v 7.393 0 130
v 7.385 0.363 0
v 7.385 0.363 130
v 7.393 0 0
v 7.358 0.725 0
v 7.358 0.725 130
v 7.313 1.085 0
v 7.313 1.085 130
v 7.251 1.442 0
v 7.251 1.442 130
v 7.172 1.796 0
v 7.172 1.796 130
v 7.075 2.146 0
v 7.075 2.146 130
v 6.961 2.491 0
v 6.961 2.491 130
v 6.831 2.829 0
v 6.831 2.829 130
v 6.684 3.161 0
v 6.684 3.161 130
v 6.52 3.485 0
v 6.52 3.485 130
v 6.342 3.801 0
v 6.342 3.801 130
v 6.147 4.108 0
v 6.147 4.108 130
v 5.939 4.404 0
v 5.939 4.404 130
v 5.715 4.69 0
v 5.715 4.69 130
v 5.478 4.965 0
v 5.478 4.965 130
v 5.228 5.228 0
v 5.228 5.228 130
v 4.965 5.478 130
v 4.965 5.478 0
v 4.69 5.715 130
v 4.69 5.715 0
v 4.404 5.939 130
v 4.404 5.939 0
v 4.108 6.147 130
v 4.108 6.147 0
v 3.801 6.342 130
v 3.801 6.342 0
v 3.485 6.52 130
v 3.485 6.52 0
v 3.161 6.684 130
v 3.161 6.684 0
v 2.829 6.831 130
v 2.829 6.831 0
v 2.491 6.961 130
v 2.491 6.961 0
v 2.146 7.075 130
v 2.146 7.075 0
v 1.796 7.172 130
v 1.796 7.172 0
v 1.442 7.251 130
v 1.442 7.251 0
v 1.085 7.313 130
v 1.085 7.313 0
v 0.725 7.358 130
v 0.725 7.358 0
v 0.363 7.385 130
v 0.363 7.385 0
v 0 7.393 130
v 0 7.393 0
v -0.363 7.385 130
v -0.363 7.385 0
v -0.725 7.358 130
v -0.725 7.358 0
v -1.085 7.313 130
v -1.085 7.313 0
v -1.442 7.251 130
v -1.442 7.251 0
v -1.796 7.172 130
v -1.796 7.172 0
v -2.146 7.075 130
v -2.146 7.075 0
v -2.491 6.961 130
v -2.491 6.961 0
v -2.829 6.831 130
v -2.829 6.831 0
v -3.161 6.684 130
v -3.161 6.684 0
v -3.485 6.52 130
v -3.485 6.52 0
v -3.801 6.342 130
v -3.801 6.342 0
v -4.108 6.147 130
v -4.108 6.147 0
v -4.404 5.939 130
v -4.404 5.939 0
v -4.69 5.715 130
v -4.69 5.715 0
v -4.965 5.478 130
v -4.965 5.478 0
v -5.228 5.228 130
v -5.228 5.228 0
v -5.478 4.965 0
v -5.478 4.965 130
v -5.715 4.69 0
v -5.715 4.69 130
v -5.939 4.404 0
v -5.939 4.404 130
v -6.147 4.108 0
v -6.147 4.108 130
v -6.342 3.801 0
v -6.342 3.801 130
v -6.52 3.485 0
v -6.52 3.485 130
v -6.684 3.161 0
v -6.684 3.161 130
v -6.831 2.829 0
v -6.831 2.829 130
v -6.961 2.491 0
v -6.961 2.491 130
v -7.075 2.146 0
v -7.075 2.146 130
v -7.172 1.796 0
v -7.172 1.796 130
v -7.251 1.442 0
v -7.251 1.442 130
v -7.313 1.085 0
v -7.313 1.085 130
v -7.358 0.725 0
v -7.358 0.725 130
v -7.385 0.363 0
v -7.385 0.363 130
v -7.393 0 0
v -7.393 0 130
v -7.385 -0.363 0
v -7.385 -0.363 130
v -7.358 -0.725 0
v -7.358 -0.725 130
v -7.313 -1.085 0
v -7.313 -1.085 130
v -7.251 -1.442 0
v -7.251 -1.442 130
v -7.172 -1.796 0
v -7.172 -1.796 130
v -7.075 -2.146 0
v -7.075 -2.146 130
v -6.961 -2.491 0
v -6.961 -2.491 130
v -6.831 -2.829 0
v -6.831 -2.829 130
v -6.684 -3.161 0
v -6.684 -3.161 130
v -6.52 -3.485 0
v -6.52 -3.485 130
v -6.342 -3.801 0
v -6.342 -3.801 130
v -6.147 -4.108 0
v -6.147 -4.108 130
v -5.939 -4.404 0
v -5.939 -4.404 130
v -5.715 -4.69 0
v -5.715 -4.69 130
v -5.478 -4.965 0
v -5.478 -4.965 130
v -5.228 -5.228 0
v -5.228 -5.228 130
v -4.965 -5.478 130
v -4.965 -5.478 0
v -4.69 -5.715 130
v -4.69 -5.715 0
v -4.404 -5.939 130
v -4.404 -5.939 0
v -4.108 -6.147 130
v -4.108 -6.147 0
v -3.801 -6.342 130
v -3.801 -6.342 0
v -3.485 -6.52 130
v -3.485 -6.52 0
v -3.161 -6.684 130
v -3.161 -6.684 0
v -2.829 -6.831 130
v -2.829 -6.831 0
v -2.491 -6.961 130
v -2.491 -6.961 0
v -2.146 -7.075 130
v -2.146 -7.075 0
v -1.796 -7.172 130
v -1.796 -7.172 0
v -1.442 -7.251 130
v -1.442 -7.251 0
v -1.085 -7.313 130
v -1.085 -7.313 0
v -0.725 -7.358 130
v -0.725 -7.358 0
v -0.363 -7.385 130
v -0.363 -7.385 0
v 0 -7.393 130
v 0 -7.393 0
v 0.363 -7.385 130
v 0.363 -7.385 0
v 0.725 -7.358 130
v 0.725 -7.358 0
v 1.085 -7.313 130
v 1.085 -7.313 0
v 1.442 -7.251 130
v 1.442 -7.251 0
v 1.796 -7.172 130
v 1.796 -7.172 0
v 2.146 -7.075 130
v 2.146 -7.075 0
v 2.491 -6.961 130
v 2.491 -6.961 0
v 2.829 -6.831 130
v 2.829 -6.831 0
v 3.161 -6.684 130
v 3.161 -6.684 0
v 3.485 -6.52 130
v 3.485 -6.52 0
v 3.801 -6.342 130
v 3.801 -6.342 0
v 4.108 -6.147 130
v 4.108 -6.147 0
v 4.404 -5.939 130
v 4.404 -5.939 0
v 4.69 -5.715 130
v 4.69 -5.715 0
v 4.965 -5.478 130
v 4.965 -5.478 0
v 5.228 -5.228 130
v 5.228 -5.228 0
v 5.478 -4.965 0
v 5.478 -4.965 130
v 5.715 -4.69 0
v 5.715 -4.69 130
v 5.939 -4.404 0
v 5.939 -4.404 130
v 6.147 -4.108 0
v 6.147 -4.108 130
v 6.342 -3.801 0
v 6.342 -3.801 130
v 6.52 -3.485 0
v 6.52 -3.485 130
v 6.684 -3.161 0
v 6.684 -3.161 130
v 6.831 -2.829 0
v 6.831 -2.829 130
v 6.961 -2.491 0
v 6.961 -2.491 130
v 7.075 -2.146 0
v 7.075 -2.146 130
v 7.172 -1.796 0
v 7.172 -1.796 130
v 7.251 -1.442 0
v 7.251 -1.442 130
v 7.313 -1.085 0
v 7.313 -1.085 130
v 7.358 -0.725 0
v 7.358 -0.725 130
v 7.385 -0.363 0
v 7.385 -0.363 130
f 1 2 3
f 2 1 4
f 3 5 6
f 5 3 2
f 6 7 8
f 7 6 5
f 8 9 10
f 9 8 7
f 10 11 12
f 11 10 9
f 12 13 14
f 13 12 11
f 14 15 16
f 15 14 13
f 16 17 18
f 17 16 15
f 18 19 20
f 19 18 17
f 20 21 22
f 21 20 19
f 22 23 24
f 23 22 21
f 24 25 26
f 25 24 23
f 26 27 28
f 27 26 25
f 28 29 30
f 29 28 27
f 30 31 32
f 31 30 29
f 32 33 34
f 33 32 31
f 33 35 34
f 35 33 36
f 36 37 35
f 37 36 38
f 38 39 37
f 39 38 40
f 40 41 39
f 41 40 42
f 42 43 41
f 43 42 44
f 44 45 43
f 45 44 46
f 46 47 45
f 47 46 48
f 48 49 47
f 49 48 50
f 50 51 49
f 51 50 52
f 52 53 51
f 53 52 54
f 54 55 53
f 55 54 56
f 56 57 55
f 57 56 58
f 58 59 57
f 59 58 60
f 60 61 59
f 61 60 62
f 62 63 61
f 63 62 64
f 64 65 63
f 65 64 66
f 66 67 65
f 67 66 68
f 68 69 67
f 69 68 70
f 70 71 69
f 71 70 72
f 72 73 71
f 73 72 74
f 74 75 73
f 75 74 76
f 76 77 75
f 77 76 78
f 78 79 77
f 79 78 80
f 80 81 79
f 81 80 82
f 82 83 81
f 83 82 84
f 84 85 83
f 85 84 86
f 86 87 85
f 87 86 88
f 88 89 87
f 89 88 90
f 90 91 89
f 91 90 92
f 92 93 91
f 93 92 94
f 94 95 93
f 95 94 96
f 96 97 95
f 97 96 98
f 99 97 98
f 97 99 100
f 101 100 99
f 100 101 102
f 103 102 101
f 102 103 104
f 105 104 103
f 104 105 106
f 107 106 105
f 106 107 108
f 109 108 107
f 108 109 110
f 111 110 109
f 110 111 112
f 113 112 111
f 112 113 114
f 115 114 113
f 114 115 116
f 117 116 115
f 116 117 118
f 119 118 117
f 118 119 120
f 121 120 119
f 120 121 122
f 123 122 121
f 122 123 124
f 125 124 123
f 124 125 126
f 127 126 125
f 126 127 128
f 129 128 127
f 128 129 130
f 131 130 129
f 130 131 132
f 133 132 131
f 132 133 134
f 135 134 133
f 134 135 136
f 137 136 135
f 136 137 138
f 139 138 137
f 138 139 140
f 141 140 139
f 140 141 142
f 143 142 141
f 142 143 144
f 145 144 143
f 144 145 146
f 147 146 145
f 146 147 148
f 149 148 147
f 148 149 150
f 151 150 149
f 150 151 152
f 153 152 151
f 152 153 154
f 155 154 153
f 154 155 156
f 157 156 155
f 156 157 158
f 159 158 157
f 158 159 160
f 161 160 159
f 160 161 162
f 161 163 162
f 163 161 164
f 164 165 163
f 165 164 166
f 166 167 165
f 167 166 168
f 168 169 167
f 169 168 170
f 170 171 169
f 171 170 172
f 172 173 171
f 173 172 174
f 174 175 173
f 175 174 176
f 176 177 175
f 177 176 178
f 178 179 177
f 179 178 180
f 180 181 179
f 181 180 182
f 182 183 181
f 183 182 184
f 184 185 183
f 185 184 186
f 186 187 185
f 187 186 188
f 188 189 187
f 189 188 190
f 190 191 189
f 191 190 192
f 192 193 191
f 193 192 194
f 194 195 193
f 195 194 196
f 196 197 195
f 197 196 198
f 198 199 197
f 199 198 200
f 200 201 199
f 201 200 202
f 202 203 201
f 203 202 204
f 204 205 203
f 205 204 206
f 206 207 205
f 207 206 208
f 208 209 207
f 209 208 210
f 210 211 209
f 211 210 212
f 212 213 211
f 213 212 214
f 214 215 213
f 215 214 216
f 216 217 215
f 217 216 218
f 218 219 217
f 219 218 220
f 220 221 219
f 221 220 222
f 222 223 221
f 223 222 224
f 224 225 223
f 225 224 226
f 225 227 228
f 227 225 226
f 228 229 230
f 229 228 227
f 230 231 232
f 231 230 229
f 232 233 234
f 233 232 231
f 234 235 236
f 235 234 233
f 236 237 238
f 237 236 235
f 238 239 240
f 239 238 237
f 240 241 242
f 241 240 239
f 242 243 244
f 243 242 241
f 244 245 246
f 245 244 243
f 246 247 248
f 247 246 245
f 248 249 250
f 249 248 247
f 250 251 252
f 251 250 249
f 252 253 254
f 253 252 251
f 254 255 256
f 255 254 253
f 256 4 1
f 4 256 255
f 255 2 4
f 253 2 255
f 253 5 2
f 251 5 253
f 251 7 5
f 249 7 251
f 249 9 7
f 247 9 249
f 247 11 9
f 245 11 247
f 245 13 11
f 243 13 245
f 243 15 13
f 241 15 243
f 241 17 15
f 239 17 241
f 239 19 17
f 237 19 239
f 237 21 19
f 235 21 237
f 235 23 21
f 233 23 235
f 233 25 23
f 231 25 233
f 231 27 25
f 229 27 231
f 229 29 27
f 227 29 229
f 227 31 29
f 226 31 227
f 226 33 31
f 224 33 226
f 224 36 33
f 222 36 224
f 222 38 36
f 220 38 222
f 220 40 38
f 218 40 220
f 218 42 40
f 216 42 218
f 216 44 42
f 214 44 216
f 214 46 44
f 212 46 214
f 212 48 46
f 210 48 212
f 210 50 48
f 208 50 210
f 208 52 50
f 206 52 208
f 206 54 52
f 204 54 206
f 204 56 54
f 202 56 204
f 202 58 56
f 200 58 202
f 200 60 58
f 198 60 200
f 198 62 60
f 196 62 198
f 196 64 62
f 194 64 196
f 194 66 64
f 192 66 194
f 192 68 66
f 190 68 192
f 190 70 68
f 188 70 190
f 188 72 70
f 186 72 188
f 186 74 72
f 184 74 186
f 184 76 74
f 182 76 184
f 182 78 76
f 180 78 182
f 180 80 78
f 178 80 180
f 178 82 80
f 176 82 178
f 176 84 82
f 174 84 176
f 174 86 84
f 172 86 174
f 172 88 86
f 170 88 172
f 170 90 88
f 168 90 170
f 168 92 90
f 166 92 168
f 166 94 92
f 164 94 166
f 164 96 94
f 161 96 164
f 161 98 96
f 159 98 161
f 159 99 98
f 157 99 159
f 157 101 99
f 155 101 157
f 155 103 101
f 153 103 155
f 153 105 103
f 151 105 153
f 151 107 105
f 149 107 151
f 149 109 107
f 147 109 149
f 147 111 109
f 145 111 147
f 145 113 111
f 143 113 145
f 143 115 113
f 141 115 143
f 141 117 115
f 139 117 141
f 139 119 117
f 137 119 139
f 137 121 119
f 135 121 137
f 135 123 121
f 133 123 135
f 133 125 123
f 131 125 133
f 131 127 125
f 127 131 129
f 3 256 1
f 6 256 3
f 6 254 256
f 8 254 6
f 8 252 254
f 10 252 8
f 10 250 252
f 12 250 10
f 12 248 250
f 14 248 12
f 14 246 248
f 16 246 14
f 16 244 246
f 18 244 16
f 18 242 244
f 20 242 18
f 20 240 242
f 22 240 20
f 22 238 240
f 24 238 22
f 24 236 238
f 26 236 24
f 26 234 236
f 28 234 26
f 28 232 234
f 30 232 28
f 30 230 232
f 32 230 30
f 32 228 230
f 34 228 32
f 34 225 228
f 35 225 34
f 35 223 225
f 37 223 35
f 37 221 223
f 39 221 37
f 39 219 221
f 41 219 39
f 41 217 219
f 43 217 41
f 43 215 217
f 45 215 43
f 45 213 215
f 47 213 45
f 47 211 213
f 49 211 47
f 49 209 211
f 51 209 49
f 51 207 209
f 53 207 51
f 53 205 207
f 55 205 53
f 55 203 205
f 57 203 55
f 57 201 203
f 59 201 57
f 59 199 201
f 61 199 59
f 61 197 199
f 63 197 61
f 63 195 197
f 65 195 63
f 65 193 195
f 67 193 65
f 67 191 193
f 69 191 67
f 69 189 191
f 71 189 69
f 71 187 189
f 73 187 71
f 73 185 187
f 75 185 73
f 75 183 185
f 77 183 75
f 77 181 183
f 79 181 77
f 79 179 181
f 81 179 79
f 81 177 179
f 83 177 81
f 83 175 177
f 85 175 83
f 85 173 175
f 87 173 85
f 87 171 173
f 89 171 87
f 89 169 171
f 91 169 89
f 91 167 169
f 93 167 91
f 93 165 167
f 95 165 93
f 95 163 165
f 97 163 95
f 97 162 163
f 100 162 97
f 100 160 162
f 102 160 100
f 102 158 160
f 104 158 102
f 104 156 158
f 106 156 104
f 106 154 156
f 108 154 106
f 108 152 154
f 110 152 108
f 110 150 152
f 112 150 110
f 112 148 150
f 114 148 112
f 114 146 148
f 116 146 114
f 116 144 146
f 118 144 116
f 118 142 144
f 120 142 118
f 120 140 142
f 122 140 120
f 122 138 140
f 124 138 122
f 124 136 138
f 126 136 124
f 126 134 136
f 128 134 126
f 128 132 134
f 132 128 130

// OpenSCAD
// ISO Metric Trapezoidal Thread TR20x4 (7e/7H), RH. Local axis +Z.
part = "male";
W = 200;
// Signed offset applied to both mating thread profiles. Negative shrinks the
// male root and opens the female groove/bearing clearance.
thread_offset = -0.25;
$fn = 128;

thread_pitch = 4;
thread_included_angle = 30;
thread_flank_angle = thread_included_angle / 2;
thread_root_overlap = 0.15;

// Installed Fusion ThreadData values for ISO Metric Trapezoidal Threads,
// TR20x4, external 7e / internal 7H. Radii are kept here in mm so the SCAD
// source and the native Thread feature use the same contract.
male_minor_r = 15.287 / 2;
male_pitch_r = 17.7725 / 2;
male_major_r = 19.85 / 2;
female_minor_r = 16.1875 / 2;
female_pitch_r = 18.1775 / 2;
female_major_r = 20.5 / 2;
female_od_r = 14;
male_length = 130;
female_length = 130;
samples_per_turn = 32;

assert(thread_offset <= -0.1 && thread_offset >= -0.4,
       "thread_offset must be -0.4..-0.1 mm (retain printable TR20x4 crests)");

function profile_r(p, j) = p[j][0];
function profile_z(p, j) = p[j][1];
function male_core_r(offset=thread_offset) = male_minor_r + offset;
function male_profile_root_r(offset=thread_offset) = male_core_r(offset) - thread_root_overlap;
function female_bore_r() = female_minor_r;
function female_profile_root_r() = female_bore_r() - thread_root_overlap;
function male_crest_halfwidth(r, offset=thread_offset) =
    thread_pitch/4 - (r - male_pitch_r)*tan(thread_flank_angle)
    + offset/cos(thread_flank_angle);
function female_crest_halfwidth(r, offset=thread_offset) =
    thread_pitch/4 - (r - female_pitch_r)*tan(thread_flank_angle)
    - offset/cos(thread_flank_angle);
function male_profile(offset=thread_offset) = let(
    root_r = male_profile_root_r(offset), crest_r = male_major_r,
    root_w = male_crest_halfwidth(root_r, offset),
    crest_w = male_crest_halfwidth(crest_r, offset)
) [[root_r,-root_w],[crest_r,-crest_w],[crest_r,crest_w],[root_r,root_w]];
function female_groove_crest_r(offset=thread_offset) = female_major_r - offset;
function female_profile(offset=thread_offset) = let(
    root_r = female_profile_root_r(), crest_r = female_groove_crest_r(offset),
    root_w = female_crest_halfwidth(root_r, offset),
    crest_w = female_crest_halfwidth(crest_r, offset)
) [[root_r,-root_w],[crest_r,-crest_w],[crest_r,crest_w],[root_r,root_w]];

// A radial/axial trapezoid follows a true helix around Z. Extending one turn
// past either end lets the finishing box produce clean, capped thread starts.
module helical_sweep(length, profile) {
    turns = length/thread_pitch + 2;
    steps = ceil(turns*samples_per_turn);
    z0 = -thread_pitch;
    dz = (length + 2*thread_pitch)/steps;
    points = [for (i=[0:steps], j=[0:3]) let(
        zc = z0 + i*dz,
        // Fusion's standard TR20x4 probe places the theta=0 crest center at
        // z=3P/4 modulo P. The common phase keeps male and female anchored.
        a = 360*(zc - 3*thread_pitch/4)/thread_pitch,
        r = profile_r(profile,j),
        z = zc + profile_z(profile,j)
    ) [r*cos(a), r*sin(a), z]];
    side_faces = [for (i=[0:steps-1], j=[0:3]) let(
        a=i*4+j, b=i*4+(j+1)%4,
        c=(i+1)*4+(j+1)%4, d=(i+1)*4+j
    ) [a,b,c,d]];
    end_faces = [[3,2,1,0], [steps*4,steps*4+1,steps*4+2,steps*4+3]];
    intersection() {
        polyhedron(points=points, faces=concat(side_faces,end_faces), convexity=10);
        translate([-11,-11,0]) cube([22,22,length]);
    }
}

module male_thread(length=130, offset=thread_offset) {
    // The profile root overlaps the offset TR20x4 minor core by 0.15 mm.
    union() {
        cylinder(h=length, r=male_core_r(offset), $fn=128);
        helical_sweep(length, male_profile(offset));
    }
}

module female_groove(length=130, offset=thread_offset) {
    union() {
        // The profile root overlaps the standard internal minor bore by 0.15 mm.
        cylinder(h=length+0.2, r=female_bore_r(), $fn=128);
        helical_sweep(length+0.2, female_profile(offset));
    }
}

module female_thread(length=130, offset=thread_offset) {
    difference() {
        union() {
            cylinder(h=length-10, r=female_od_r, $fn=128);
            translate([0,0,length-10]) cylinder(h=2,r1=14,r2=12,$fn=128);
            translate([0,0,length-8]) cylinder(h=8,r=12,$fn=128);
            // Captive double cone: each ramp is 45 degrees in print orientation.
            translate([0,0,length]) cylinder(h=4,r1=12,r2=16,$fn=128);
            translate([0,0,length+4]) cylinder(h=4,r1=16,r2=12,$fn=128);
            // This end and the stationary plate both start on the print bed.
            translate([0,0,length+8]) cylinder(h=2,r=12,$fn=128);
        }
        // Thread stops before journal; the standard minor bore continues through
        // the smooth journal and leaves the existing wall arrangement intact.
        female_groove(length-12, offset);
        translate([0,0,-0.1]) cylinder(h=length+10.2,r=female_bore_r(),$fn=128);
    }
}

if (part == "male") male_thread(male_length);
if (part == "female") female_thread(female_length, thread_offset);
if (part == "fdm-profile-check") {
    // A standard 30 degree included angle is intentional. This gate checks
    // profile identity and positive FDM clearance; it does not classify the
    // 15 degree flanks as a 45 degree source-overhang limit.
    assert(abs(thread_included_angle - 30) < 0.0001,
        "TR20x4 must keep the 30 degree included flank angle");
    assert(female_groove_crest_r() > male_major_r,
        "FDM crest clearance must remain positive");
    assert(female_bore_r() > male_core_r(),
        "FDM root clearance must remain positive");
    cube(1);
}
if (part == "offset-check") {
    assert(abs(male_core_r() - 7.3935) < 0.0001,
        "TR20x4 male offset core radius must be 7.3935 mm");
    assert(abs(male_profile()[0][0] - 7.2435) < 0.0001,
        "Male profile root must overlap the offset core by 0.15 mm");
    assert(abs(male_profile()[1][0] - 9.925) < 0.0001,
        "TR20x4 male crest radius must remain 9.925 mm");
    assert(abs(female_bore_r() - 8.09375) < 0.0001,
        "TR20x4 female minor bore radius must remain 8.09375 mm");
    assert(abs(female_profile()[0][0] - 7.94375) < 0.0001,
        "Female profile root must overlap the bore by 0.15 mm");
    assert(abs(female_profile()[1][0] - 10.5) < 0.0001,
        "TR20x4 female groove crest radius must be 10.5 mm");
    cube(1);
}
// W=200 nominal engagement test: the female origin is translated by 50 mm,
// so its helix is phase-shifted half a turn to mate with the male.
if (part == "pair-test") {
    assert(W >= 180 && W <= 250, "W must be 180..250 mm");
    translate([0,0,10]) male_thread(male_length);
    translate([0,0,W-140]) rotate([0,0,360*(W-150)/thread_pitch])
        female_thread(female_length, thread_offset);
}
